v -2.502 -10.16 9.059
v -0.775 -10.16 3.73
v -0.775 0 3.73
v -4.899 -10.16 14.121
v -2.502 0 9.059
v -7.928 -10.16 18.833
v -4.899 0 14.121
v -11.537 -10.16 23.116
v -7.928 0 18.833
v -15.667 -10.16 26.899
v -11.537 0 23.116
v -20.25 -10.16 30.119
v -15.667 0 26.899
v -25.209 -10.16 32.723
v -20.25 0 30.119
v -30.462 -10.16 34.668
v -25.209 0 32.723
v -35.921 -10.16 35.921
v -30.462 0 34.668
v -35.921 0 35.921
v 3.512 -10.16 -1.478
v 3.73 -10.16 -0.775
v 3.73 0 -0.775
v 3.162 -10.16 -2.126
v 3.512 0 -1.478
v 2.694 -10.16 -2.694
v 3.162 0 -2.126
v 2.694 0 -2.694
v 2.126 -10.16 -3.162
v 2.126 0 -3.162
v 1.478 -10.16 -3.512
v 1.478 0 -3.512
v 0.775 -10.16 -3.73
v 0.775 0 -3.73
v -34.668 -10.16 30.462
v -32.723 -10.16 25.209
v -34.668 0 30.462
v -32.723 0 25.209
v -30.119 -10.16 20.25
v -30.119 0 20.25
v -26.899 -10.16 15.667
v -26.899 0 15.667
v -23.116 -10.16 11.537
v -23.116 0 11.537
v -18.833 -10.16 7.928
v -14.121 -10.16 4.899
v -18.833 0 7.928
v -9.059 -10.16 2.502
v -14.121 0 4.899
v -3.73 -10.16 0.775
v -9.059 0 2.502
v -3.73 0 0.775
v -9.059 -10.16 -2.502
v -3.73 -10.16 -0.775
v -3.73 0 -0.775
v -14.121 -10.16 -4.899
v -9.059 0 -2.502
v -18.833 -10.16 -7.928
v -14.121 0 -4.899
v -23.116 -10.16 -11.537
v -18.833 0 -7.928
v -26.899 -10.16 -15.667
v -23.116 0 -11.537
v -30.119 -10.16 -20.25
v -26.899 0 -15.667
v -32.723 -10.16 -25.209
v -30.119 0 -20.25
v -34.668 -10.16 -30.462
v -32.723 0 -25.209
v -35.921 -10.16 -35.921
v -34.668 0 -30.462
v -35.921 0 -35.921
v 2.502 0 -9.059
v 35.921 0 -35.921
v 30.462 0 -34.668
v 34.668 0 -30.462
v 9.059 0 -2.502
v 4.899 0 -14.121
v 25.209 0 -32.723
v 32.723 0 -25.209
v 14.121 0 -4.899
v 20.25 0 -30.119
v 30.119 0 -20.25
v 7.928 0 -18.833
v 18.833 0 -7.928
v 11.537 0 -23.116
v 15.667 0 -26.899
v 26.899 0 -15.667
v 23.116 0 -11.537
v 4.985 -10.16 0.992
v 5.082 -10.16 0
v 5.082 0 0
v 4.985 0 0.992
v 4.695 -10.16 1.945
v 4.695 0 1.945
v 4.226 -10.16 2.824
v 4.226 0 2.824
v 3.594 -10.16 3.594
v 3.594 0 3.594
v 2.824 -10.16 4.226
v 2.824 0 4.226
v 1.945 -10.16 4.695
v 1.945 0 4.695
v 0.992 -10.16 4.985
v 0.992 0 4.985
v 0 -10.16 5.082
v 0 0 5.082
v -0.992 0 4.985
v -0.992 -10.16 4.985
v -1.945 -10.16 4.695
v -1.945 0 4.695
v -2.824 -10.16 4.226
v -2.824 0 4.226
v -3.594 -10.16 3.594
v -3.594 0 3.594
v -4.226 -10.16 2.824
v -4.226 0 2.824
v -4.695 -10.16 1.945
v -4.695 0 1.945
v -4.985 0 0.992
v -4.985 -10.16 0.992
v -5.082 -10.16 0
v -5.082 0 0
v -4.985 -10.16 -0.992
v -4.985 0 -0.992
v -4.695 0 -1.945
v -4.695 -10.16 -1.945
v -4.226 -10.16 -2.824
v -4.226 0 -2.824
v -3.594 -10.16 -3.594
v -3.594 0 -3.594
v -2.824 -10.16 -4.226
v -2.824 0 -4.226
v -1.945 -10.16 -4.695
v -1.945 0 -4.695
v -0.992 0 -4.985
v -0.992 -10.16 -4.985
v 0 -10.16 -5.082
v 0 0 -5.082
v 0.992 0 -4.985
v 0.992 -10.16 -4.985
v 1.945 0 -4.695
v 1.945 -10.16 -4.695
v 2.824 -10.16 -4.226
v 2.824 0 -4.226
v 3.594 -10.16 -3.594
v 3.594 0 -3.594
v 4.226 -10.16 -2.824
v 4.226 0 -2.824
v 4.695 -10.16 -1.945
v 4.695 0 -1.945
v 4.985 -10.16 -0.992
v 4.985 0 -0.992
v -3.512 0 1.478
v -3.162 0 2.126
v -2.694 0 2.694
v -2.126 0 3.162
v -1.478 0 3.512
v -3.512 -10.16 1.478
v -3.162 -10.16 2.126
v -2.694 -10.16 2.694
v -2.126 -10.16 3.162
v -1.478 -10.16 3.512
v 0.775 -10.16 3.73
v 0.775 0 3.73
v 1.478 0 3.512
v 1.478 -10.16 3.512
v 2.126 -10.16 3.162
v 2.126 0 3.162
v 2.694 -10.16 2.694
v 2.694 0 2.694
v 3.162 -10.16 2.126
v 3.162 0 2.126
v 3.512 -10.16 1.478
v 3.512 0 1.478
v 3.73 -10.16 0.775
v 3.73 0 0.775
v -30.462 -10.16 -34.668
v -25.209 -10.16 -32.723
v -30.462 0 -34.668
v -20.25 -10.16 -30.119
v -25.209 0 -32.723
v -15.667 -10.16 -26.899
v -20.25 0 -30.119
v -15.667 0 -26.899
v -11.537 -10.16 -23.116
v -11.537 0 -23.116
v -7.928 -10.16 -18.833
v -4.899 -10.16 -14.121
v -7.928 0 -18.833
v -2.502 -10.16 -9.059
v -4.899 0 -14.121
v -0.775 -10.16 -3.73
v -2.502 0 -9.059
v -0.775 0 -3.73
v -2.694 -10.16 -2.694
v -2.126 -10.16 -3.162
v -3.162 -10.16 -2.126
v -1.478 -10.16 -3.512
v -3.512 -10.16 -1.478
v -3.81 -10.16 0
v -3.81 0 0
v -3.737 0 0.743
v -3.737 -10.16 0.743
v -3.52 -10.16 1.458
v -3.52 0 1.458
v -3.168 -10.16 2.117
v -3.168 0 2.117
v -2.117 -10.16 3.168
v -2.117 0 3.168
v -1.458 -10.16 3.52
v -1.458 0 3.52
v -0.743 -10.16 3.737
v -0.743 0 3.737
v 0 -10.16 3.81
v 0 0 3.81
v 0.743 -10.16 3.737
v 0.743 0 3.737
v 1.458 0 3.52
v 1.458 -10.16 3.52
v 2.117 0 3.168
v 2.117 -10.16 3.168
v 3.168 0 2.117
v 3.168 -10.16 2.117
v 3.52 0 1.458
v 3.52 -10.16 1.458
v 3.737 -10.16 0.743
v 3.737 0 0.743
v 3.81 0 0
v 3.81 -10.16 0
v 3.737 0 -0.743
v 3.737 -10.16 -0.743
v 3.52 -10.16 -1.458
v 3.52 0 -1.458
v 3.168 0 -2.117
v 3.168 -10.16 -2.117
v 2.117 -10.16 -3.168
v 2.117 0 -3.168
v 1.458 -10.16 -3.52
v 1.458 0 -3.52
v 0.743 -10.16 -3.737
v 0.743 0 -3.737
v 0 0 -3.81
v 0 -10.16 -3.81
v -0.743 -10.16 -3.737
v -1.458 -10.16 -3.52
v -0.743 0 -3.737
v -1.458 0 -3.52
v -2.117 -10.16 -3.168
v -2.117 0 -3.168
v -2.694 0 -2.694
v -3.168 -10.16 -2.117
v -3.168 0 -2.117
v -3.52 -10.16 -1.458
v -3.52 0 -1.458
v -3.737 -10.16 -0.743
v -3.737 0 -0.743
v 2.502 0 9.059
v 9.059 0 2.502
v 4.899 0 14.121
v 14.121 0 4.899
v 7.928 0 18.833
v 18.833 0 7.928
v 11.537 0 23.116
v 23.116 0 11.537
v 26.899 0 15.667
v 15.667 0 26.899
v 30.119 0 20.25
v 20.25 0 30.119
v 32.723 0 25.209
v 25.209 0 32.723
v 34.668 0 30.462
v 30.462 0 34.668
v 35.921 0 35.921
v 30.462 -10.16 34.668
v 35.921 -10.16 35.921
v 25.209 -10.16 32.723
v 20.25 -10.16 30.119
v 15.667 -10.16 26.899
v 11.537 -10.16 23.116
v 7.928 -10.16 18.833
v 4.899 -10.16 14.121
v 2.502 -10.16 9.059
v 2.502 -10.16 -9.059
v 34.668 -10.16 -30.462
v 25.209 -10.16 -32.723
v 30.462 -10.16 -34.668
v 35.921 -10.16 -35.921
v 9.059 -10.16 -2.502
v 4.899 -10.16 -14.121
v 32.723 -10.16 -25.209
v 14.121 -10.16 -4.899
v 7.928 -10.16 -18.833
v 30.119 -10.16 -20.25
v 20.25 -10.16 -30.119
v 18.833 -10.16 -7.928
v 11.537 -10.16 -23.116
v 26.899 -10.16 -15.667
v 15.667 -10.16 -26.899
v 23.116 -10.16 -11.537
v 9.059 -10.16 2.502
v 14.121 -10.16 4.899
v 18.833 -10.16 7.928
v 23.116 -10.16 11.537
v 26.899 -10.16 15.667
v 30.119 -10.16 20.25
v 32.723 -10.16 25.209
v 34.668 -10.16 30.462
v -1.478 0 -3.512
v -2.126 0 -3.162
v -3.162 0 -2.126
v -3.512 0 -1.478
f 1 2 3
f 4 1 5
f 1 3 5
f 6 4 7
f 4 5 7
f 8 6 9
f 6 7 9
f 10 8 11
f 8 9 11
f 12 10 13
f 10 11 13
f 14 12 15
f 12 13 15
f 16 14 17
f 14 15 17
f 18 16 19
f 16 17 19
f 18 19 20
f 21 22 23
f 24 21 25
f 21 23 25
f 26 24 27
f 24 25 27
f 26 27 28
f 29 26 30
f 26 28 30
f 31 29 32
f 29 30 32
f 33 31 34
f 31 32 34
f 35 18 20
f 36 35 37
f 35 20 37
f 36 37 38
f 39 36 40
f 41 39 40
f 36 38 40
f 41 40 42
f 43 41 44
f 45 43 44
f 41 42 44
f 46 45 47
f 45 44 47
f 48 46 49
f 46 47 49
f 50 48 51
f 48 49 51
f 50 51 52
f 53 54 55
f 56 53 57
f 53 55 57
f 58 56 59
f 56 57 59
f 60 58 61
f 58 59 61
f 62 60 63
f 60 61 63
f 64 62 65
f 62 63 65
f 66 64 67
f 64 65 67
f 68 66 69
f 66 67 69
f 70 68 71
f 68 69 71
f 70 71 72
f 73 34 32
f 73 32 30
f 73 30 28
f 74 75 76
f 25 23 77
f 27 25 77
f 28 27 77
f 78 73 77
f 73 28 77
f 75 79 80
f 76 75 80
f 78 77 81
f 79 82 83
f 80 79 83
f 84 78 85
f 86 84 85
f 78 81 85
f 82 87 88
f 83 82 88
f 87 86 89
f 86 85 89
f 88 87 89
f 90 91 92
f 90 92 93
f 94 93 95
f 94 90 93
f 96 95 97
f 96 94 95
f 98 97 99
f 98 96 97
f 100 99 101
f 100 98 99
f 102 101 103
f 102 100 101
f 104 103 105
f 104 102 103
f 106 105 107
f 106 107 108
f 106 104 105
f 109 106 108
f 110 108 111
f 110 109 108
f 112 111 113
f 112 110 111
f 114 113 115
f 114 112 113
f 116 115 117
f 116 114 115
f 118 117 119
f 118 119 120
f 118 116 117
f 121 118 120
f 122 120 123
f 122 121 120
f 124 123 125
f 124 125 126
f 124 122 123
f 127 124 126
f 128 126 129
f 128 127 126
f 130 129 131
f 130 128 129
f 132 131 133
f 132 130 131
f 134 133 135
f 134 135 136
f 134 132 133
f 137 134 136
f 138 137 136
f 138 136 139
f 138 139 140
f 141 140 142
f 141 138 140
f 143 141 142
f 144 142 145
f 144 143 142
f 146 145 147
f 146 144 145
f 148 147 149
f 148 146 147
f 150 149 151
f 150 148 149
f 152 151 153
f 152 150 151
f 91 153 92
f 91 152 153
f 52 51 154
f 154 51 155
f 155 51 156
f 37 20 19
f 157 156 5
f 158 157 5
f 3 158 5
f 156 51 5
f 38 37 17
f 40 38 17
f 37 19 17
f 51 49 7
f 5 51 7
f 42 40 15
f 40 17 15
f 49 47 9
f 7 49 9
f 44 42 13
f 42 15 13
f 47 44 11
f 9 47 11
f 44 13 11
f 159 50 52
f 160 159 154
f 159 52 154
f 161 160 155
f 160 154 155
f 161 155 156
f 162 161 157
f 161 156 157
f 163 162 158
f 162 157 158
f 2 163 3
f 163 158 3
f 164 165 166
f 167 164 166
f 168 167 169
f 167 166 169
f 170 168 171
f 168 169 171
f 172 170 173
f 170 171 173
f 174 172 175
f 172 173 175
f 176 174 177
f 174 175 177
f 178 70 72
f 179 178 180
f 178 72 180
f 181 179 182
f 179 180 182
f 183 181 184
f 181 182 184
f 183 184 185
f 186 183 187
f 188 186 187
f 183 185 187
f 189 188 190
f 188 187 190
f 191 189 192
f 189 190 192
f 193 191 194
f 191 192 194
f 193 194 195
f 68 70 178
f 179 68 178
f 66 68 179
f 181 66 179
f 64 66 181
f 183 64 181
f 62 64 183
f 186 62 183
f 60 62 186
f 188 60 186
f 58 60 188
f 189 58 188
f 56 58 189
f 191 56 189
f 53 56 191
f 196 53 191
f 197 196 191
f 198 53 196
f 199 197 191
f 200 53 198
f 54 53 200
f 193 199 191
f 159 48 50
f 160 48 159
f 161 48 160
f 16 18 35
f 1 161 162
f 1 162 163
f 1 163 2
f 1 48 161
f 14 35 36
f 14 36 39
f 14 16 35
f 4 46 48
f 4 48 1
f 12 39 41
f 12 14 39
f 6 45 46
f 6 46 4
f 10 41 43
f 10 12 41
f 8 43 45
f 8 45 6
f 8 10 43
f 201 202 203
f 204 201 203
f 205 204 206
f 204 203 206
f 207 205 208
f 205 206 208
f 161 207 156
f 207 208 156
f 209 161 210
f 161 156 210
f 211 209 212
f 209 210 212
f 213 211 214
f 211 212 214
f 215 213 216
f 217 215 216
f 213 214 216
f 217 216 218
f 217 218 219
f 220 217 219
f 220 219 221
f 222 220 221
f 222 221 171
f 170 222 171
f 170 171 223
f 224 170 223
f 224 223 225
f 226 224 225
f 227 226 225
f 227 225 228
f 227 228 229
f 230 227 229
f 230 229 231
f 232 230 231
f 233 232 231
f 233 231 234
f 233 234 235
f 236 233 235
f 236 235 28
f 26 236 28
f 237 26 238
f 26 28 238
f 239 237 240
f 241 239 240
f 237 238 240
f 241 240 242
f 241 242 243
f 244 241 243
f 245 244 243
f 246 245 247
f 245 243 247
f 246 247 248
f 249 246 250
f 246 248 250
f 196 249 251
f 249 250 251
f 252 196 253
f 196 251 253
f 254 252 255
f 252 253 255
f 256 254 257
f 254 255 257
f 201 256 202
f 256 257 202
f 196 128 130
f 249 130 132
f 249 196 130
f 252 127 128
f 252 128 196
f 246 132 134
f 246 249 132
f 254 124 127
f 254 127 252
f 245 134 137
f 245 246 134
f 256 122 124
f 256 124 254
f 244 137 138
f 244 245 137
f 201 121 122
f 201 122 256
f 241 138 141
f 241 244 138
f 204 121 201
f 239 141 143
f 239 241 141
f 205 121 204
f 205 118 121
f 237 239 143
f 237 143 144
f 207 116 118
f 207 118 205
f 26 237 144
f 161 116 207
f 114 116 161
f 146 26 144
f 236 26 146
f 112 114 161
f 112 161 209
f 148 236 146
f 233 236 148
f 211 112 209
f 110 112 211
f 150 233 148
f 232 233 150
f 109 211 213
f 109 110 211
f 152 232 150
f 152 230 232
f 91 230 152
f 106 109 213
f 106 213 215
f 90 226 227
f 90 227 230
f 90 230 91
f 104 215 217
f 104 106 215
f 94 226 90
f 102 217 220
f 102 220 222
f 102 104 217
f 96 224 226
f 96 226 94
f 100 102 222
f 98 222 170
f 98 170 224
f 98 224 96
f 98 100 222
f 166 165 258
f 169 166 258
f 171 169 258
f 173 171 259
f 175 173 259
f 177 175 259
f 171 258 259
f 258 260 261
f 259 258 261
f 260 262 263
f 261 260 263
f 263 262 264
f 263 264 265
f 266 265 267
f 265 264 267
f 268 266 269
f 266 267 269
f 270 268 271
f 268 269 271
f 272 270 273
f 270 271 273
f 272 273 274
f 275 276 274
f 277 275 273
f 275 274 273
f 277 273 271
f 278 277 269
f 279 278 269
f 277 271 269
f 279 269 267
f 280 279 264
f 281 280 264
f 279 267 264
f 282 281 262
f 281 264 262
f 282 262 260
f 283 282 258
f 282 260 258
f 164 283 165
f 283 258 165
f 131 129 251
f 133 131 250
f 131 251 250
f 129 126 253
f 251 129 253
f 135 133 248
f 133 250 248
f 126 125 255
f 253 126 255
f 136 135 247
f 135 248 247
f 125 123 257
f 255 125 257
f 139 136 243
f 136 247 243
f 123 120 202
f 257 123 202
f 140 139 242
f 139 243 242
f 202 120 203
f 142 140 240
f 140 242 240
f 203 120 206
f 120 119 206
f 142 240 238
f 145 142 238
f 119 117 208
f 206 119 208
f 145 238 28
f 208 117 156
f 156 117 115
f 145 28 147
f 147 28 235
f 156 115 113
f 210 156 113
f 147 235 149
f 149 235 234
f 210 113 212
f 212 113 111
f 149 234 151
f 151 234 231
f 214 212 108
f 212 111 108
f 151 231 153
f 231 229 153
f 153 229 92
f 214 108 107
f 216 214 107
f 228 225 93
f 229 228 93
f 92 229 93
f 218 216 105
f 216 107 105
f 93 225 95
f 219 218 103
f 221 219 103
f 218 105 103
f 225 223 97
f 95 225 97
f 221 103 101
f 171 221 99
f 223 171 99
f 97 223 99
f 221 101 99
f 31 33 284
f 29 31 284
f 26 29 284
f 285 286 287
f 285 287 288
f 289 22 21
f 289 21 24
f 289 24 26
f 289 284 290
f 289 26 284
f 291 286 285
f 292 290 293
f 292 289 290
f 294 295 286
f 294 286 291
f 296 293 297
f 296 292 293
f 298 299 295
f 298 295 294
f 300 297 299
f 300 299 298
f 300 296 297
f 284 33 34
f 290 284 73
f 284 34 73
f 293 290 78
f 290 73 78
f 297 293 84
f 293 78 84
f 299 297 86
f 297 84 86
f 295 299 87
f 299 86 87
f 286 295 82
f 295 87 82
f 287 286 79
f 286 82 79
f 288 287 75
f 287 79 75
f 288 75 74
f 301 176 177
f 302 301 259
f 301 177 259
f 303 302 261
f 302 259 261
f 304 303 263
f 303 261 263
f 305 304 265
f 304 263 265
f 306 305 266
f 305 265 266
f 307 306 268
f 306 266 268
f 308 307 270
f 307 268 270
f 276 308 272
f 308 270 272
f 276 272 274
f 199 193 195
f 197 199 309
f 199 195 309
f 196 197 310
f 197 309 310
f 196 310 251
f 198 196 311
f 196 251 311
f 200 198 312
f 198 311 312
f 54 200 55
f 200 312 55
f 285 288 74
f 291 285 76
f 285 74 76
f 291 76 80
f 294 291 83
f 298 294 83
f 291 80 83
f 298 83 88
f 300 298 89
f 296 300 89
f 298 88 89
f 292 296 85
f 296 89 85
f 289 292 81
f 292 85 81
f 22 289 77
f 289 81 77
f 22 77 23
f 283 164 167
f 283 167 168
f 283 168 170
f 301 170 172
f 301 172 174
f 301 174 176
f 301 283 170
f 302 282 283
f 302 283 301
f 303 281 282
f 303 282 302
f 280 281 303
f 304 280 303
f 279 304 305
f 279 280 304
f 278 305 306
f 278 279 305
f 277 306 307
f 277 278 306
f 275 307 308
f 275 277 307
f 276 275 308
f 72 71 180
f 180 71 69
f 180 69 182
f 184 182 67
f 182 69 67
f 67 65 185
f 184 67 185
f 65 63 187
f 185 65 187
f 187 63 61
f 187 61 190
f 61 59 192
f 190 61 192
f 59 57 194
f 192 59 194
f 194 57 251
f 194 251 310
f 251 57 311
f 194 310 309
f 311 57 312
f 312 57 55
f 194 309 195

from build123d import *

# Parameters (mm, degrees)
F1_DEPTH = 10.16
F2_R     = 5.082305
F3_DEPTH = 10.16
F4_R     = 3.81
F5_DEPTH = 37.338


with BuildPart() as f1:
    # F0 (on Front) → F1 (new body)
    with BuildSketch(Plane.XZ):
        with BuildLine():
            ThreePointArc((0, 0), (23.756418, 12.164606), (35.921024, 35.921024))
            ThreePointArc((35.921024, 35.921024), (12.164606, 23.756419), (0, 0))
        make_face()
        with BuildLine():
            ThreePointArc((-35.921024, -35.921024), (-12.164606, -23.756418), (0, 0))
            ThreePointArc((0, 0), (-23.756418, -12.164606), (-35.921024, -35.921024))
        make_face()
        with BuildLine():
            ThreePointArc((0, 0), (-12.164606, 23.756418), (-35.921024, 35.921024))
            ThreePointArc((-35.921024, 35.921024), (-23.756418, 12.164606), (0, 0))
        make_face()
        with BuildLine():
            ThreePointArc((0, 0), (12.164606, -23.756418), (35.921024, -35.921024))
            ThreePointArc((35.921024, -35.921024), (23.756418, -12.164606), (0, 0))
        make_face()
    extrude(amount=F1_DEPTH)


with BuildPart() as f3:
    # F2 (on face) → F3 (new body)
    with BuildSketch(Plane.XZ.offset(10.16)):
        Circle(F2_R)
    extrude(amount=-F3_DEPTH)


with BuildPart() as f5_tool:
    # F4 (on face) → F5 (new body)
    with BuildSketch(Plane(origin=(0, 0, 0), x_dir=(-1, 0, 0), z_dir=(0, 1, 0))):
        Circle(F4_R)
    extrude(amount=-F5_DEPTH)


with BuildPart() as f1_1:
    add(f1.part)

    # F5: cut by f5_tool
    add(f5_tool.part, mode=Mode.SUBTRACT)


with BuildPart() as f3_1:
    add(f3.part)

    # F5: cut by f5_tool
    add(f5_tool.part, mode=Mode.SUBTRACT)


solid = Compound([f1_1.part, f3_1.part])
